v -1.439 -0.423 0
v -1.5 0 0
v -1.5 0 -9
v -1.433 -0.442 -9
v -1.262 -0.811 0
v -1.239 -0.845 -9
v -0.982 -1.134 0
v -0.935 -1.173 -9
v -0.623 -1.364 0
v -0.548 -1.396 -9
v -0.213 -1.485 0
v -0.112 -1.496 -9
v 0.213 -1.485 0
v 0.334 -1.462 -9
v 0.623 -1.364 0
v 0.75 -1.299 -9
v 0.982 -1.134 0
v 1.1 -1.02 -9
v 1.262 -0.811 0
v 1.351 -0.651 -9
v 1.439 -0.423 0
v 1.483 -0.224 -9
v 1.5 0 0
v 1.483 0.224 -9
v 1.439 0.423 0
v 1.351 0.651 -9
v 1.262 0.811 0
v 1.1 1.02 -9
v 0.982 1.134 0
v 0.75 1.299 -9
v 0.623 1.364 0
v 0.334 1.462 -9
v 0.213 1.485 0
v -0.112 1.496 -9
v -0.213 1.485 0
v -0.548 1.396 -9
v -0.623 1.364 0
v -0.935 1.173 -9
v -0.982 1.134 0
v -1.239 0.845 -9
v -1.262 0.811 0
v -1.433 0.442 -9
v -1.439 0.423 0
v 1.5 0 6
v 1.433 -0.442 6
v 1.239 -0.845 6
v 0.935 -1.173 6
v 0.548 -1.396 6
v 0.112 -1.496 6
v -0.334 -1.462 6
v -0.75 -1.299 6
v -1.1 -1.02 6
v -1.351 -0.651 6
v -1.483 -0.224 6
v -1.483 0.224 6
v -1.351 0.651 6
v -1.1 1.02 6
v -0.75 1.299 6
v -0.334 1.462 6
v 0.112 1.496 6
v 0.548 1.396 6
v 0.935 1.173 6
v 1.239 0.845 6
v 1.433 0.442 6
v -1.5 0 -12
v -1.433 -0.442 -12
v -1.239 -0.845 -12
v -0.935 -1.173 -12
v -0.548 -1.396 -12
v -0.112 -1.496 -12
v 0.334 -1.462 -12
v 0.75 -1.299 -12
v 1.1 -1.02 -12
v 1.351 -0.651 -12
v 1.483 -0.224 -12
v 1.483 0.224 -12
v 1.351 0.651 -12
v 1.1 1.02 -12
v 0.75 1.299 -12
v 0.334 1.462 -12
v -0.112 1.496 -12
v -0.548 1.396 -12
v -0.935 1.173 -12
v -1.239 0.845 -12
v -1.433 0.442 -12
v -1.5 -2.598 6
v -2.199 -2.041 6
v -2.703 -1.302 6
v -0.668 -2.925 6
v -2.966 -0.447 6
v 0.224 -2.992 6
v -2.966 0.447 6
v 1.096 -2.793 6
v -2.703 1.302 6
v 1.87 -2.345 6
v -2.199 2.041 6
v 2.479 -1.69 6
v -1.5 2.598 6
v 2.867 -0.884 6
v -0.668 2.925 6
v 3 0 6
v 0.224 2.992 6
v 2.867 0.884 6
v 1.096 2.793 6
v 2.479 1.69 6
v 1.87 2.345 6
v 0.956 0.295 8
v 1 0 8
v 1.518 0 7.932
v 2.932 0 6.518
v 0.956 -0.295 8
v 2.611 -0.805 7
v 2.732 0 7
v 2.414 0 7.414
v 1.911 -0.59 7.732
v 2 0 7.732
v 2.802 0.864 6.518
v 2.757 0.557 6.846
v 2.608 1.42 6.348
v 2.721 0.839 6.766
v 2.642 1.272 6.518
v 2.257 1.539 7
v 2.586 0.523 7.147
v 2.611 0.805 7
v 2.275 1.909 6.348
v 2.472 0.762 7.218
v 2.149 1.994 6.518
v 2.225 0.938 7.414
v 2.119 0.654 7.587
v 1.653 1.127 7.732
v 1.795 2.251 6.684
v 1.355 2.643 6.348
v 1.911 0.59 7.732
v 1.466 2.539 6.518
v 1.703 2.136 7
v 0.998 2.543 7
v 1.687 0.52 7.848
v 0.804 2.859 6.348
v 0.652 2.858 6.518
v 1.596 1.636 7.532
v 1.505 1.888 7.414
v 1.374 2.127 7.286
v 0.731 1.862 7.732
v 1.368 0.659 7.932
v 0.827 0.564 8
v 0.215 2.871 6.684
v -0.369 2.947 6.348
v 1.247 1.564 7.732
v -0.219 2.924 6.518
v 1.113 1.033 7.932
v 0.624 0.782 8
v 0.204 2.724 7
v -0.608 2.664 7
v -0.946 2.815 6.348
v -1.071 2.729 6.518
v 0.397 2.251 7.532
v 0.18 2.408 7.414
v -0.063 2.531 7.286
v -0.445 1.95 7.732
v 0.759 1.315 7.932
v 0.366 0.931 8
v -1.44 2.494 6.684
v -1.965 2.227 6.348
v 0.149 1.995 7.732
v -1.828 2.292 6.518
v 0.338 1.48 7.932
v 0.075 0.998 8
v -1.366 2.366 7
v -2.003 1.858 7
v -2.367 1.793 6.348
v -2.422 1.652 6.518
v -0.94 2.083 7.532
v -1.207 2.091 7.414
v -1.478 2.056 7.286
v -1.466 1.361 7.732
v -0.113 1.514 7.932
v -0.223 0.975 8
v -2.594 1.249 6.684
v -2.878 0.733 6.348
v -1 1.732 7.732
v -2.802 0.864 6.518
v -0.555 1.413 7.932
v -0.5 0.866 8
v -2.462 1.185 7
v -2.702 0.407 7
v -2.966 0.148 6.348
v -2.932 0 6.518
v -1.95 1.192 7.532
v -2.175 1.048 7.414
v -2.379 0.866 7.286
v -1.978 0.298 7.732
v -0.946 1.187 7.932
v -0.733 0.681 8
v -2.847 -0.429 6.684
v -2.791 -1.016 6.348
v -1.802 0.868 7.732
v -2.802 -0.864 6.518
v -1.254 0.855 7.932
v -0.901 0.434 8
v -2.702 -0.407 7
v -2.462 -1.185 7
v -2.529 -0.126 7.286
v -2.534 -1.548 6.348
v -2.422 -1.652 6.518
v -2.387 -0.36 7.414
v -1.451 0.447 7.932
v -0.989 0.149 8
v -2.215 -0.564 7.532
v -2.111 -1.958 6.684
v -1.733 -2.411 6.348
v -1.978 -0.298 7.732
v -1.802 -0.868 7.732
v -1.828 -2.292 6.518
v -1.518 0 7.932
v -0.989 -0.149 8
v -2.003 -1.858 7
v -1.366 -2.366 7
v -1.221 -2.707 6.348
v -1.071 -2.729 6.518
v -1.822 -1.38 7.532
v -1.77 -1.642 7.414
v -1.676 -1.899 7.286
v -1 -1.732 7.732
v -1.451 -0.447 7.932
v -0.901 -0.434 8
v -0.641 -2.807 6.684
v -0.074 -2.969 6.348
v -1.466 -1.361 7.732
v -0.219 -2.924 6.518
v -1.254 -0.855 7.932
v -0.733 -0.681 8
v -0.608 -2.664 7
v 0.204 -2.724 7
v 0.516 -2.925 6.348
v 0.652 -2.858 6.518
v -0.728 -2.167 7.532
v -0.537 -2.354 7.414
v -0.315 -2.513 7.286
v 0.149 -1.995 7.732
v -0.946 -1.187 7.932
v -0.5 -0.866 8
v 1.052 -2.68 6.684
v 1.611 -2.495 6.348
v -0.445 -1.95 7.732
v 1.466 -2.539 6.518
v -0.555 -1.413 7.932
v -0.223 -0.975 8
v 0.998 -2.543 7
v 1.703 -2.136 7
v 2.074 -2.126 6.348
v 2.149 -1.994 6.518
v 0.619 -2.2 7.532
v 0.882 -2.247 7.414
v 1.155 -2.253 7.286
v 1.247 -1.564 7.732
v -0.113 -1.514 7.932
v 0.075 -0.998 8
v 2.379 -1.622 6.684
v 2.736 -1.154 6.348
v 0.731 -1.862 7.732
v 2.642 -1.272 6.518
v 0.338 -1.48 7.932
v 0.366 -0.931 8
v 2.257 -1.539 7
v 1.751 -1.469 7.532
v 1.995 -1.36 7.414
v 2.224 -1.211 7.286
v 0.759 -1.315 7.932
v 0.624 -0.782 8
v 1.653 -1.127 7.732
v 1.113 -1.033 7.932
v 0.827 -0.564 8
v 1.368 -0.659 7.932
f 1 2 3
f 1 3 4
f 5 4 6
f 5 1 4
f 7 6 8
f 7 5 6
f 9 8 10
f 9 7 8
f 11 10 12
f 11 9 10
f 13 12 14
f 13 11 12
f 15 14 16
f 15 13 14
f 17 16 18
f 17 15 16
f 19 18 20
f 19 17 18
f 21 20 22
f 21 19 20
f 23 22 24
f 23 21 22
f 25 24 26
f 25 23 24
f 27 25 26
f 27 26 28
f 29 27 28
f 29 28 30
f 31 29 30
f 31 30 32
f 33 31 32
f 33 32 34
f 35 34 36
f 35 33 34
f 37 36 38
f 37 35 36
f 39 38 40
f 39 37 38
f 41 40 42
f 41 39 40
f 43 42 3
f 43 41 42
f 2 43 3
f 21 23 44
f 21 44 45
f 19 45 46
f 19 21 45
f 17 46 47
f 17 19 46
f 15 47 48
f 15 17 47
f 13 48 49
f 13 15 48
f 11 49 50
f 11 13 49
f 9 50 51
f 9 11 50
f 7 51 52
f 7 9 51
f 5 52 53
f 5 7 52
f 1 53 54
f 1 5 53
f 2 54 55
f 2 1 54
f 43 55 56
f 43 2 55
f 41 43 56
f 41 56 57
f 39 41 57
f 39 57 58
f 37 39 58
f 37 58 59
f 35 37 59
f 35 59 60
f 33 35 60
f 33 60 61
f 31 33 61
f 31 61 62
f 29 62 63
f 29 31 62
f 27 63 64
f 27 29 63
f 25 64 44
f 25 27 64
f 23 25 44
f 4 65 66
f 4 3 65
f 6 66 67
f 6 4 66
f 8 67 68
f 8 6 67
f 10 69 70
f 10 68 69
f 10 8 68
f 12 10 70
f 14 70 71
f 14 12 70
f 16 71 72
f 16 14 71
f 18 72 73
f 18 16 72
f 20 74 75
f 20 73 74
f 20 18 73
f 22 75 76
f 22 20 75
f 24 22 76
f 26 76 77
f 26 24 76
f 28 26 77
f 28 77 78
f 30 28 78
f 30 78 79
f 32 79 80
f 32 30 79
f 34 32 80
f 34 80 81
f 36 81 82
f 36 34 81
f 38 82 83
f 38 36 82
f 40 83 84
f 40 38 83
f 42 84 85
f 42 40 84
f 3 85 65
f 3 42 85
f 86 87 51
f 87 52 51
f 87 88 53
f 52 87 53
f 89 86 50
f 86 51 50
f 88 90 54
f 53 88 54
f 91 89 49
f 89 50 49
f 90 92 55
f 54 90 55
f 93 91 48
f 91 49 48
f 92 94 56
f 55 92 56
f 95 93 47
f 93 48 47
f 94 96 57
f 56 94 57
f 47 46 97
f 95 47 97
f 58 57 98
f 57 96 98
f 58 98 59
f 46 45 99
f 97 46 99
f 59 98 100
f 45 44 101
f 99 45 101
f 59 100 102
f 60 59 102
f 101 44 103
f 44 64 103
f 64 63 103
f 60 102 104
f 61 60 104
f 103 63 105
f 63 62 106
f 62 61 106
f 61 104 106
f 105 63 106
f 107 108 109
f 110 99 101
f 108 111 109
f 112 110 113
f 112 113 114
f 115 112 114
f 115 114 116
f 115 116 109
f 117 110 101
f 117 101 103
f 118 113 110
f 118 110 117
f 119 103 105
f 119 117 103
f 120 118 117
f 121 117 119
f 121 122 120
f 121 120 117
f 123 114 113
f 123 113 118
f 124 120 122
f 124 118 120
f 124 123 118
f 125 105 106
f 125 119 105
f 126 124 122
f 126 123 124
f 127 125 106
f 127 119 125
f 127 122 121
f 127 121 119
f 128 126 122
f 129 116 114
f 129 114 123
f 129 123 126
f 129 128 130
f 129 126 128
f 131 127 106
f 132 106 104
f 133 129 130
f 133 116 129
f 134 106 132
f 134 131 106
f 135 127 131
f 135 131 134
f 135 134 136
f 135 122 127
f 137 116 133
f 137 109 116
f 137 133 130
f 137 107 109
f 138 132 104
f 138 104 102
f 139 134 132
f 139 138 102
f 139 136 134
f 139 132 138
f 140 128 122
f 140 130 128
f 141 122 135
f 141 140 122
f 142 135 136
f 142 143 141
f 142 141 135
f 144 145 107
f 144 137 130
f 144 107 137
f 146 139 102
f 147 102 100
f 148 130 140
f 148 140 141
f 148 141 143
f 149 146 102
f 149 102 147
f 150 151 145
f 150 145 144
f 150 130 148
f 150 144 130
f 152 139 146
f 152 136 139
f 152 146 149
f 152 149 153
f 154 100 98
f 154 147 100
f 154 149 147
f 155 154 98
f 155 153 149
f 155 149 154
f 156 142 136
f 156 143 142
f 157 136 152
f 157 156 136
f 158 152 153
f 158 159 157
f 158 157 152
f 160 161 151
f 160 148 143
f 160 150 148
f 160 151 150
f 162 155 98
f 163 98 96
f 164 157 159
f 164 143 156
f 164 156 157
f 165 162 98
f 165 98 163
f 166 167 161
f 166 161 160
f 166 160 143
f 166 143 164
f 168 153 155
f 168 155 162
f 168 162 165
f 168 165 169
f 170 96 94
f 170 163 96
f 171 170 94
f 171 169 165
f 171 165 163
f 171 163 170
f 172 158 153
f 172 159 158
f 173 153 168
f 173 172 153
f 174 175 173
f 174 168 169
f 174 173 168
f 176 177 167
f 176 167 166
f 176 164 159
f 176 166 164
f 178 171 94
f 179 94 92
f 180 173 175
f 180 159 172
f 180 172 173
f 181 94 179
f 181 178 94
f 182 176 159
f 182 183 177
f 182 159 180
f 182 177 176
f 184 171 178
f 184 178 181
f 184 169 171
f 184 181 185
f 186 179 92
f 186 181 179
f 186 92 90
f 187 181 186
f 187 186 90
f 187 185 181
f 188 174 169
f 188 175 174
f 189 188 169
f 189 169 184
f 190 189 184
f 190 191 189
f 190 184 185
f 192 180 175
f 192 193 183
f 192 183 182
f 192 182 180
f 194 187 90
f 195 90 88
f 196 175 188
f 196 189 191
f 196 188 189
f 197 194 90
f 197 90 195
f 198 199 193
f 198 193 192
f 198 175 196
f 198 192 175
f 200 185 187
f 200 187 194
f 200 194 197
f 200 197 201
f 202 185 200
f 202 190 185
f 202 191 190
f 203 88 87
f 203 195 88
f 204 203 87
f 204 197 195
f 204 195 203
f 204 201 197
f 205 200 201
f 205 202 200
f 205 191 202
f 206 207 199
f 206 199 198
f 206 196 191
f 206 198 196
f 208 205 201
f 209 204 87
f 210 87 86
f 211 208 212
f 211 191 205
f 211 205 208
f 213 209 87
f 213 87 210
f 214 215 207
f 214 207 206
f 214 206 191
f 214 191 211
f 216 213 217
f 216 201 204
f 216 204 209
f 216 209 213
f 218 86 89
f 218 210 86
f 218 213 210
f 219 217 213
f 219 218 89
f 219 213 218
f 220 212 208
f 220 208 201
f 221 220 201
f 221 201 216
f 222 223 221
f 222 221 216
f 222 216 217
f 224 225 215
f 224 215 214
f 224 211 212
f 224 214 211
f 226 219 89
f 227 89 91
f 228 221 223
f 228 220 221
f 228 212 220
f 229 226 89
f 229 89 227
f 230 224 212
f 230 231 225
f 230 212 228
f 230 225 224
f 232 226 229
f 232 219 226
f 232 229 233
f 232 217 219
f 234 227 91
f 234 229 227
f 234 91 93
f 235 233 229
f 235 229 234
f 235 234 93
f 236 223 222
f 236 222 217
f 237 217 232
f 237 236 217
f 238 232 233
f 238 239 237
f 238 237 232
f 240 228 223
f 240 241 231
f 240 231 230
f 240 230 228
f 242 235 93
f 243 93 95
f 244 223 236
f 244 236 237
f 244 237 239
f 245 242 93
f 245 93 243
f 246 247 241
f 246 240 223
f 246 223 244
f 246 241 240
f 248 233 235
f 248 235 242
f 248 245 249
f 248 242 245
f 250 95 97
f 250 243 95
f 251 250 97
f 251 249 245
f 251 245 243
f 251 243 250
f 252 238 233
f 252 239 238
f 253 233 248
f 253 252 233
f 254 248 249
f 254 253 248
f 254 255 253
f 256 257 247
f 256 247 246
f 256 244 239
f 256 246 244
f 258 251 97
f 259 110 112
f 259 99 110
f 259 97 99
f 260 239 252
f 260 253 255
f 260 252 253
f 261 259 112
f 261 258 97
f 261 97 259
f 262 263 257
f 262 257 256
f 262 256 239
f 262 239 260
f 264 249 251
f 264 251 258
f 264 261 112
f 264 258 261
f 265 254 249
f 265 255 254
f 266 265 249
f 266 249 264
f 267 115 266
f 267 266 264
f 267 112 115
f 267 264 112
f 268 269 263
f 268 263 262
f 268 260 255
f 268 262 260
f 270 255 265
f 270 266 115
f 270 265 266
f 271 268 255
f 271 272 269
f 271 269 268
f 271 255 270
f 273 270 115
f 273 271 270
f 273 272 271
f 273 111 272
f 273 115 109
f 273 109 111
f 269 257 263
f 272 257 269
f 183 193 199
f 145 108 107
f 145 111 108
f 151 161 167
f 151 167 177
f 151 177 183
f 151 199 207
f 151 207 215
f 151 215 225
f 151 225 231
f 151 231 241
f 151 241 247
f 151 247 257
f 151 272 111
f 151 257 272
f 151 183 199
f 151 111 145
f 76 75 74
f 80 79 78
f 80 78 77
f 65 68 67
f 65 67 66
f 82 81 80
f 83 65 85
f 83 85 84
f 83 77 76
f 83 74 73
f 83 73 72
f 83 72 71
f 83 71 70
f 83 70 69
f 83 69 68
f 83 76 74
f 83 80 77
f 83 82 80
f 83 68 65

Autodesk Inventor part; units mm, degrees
ref_plane "YZ Plane" through (0, 0, 0) normal (1, 0, 0) x (0, 1, 0)
ref_plane "XZ Plane" through (0, 0, 0) normal (0, 1, 0) x (-1, 0, 0)
ref_plane "XY Plane" through (0, 0, 0) normal (0, 0, 1) x (1, 0, 0)
sketch "スケッチ1" plane through (0, 0, 0) normal (0, 0, 1) x (1, 0, 0)
  circle A0 centre (0, 0) radius 1.5
  dimension "d0" = 3
extrude "押し出し1" add sketch "スケッチ1" along normal blind 6
sketch "スケッチ2" plane through (0, 0, 6) normal (0, 0, 1) x (1, 0, 0)
  circle A0 centre (0, 0) radius 1.5 projected
  circle A1 centre (0, 0) radius 3
  dimension "d3" = 6
extrude "押し出し2" add sketch "スケッチ2" along normal blind 2 contours A0 | A1
fillet "フィレット1" radius 2 1 edges at (-3, 0, 8)
thread "ねじ1" size "M3x0.5" class "6g" standard "ANSI Metric M Profile" full length
sketch "スケッチ3" plane through (0, 0, 0) normal (0, 0, -1) x (-1, 0, 0)
  circle A0 centre (0, 0) radius 1.5 projected
extrude "押し出し3" add sketch "スケッチ3" along normal blind 9
sketch "スケッチ4" plane through (0, 0, -9) normal (0, 0, -1) x (-1, 0, 0)
  circle A0 centre (0, 0) radius 1.5 projected
extrude "押し出し4" add sketch "スケッチ4" along normal blind 3
properties part number "SB　18mmなべネジ" material "Steel, Mild"
